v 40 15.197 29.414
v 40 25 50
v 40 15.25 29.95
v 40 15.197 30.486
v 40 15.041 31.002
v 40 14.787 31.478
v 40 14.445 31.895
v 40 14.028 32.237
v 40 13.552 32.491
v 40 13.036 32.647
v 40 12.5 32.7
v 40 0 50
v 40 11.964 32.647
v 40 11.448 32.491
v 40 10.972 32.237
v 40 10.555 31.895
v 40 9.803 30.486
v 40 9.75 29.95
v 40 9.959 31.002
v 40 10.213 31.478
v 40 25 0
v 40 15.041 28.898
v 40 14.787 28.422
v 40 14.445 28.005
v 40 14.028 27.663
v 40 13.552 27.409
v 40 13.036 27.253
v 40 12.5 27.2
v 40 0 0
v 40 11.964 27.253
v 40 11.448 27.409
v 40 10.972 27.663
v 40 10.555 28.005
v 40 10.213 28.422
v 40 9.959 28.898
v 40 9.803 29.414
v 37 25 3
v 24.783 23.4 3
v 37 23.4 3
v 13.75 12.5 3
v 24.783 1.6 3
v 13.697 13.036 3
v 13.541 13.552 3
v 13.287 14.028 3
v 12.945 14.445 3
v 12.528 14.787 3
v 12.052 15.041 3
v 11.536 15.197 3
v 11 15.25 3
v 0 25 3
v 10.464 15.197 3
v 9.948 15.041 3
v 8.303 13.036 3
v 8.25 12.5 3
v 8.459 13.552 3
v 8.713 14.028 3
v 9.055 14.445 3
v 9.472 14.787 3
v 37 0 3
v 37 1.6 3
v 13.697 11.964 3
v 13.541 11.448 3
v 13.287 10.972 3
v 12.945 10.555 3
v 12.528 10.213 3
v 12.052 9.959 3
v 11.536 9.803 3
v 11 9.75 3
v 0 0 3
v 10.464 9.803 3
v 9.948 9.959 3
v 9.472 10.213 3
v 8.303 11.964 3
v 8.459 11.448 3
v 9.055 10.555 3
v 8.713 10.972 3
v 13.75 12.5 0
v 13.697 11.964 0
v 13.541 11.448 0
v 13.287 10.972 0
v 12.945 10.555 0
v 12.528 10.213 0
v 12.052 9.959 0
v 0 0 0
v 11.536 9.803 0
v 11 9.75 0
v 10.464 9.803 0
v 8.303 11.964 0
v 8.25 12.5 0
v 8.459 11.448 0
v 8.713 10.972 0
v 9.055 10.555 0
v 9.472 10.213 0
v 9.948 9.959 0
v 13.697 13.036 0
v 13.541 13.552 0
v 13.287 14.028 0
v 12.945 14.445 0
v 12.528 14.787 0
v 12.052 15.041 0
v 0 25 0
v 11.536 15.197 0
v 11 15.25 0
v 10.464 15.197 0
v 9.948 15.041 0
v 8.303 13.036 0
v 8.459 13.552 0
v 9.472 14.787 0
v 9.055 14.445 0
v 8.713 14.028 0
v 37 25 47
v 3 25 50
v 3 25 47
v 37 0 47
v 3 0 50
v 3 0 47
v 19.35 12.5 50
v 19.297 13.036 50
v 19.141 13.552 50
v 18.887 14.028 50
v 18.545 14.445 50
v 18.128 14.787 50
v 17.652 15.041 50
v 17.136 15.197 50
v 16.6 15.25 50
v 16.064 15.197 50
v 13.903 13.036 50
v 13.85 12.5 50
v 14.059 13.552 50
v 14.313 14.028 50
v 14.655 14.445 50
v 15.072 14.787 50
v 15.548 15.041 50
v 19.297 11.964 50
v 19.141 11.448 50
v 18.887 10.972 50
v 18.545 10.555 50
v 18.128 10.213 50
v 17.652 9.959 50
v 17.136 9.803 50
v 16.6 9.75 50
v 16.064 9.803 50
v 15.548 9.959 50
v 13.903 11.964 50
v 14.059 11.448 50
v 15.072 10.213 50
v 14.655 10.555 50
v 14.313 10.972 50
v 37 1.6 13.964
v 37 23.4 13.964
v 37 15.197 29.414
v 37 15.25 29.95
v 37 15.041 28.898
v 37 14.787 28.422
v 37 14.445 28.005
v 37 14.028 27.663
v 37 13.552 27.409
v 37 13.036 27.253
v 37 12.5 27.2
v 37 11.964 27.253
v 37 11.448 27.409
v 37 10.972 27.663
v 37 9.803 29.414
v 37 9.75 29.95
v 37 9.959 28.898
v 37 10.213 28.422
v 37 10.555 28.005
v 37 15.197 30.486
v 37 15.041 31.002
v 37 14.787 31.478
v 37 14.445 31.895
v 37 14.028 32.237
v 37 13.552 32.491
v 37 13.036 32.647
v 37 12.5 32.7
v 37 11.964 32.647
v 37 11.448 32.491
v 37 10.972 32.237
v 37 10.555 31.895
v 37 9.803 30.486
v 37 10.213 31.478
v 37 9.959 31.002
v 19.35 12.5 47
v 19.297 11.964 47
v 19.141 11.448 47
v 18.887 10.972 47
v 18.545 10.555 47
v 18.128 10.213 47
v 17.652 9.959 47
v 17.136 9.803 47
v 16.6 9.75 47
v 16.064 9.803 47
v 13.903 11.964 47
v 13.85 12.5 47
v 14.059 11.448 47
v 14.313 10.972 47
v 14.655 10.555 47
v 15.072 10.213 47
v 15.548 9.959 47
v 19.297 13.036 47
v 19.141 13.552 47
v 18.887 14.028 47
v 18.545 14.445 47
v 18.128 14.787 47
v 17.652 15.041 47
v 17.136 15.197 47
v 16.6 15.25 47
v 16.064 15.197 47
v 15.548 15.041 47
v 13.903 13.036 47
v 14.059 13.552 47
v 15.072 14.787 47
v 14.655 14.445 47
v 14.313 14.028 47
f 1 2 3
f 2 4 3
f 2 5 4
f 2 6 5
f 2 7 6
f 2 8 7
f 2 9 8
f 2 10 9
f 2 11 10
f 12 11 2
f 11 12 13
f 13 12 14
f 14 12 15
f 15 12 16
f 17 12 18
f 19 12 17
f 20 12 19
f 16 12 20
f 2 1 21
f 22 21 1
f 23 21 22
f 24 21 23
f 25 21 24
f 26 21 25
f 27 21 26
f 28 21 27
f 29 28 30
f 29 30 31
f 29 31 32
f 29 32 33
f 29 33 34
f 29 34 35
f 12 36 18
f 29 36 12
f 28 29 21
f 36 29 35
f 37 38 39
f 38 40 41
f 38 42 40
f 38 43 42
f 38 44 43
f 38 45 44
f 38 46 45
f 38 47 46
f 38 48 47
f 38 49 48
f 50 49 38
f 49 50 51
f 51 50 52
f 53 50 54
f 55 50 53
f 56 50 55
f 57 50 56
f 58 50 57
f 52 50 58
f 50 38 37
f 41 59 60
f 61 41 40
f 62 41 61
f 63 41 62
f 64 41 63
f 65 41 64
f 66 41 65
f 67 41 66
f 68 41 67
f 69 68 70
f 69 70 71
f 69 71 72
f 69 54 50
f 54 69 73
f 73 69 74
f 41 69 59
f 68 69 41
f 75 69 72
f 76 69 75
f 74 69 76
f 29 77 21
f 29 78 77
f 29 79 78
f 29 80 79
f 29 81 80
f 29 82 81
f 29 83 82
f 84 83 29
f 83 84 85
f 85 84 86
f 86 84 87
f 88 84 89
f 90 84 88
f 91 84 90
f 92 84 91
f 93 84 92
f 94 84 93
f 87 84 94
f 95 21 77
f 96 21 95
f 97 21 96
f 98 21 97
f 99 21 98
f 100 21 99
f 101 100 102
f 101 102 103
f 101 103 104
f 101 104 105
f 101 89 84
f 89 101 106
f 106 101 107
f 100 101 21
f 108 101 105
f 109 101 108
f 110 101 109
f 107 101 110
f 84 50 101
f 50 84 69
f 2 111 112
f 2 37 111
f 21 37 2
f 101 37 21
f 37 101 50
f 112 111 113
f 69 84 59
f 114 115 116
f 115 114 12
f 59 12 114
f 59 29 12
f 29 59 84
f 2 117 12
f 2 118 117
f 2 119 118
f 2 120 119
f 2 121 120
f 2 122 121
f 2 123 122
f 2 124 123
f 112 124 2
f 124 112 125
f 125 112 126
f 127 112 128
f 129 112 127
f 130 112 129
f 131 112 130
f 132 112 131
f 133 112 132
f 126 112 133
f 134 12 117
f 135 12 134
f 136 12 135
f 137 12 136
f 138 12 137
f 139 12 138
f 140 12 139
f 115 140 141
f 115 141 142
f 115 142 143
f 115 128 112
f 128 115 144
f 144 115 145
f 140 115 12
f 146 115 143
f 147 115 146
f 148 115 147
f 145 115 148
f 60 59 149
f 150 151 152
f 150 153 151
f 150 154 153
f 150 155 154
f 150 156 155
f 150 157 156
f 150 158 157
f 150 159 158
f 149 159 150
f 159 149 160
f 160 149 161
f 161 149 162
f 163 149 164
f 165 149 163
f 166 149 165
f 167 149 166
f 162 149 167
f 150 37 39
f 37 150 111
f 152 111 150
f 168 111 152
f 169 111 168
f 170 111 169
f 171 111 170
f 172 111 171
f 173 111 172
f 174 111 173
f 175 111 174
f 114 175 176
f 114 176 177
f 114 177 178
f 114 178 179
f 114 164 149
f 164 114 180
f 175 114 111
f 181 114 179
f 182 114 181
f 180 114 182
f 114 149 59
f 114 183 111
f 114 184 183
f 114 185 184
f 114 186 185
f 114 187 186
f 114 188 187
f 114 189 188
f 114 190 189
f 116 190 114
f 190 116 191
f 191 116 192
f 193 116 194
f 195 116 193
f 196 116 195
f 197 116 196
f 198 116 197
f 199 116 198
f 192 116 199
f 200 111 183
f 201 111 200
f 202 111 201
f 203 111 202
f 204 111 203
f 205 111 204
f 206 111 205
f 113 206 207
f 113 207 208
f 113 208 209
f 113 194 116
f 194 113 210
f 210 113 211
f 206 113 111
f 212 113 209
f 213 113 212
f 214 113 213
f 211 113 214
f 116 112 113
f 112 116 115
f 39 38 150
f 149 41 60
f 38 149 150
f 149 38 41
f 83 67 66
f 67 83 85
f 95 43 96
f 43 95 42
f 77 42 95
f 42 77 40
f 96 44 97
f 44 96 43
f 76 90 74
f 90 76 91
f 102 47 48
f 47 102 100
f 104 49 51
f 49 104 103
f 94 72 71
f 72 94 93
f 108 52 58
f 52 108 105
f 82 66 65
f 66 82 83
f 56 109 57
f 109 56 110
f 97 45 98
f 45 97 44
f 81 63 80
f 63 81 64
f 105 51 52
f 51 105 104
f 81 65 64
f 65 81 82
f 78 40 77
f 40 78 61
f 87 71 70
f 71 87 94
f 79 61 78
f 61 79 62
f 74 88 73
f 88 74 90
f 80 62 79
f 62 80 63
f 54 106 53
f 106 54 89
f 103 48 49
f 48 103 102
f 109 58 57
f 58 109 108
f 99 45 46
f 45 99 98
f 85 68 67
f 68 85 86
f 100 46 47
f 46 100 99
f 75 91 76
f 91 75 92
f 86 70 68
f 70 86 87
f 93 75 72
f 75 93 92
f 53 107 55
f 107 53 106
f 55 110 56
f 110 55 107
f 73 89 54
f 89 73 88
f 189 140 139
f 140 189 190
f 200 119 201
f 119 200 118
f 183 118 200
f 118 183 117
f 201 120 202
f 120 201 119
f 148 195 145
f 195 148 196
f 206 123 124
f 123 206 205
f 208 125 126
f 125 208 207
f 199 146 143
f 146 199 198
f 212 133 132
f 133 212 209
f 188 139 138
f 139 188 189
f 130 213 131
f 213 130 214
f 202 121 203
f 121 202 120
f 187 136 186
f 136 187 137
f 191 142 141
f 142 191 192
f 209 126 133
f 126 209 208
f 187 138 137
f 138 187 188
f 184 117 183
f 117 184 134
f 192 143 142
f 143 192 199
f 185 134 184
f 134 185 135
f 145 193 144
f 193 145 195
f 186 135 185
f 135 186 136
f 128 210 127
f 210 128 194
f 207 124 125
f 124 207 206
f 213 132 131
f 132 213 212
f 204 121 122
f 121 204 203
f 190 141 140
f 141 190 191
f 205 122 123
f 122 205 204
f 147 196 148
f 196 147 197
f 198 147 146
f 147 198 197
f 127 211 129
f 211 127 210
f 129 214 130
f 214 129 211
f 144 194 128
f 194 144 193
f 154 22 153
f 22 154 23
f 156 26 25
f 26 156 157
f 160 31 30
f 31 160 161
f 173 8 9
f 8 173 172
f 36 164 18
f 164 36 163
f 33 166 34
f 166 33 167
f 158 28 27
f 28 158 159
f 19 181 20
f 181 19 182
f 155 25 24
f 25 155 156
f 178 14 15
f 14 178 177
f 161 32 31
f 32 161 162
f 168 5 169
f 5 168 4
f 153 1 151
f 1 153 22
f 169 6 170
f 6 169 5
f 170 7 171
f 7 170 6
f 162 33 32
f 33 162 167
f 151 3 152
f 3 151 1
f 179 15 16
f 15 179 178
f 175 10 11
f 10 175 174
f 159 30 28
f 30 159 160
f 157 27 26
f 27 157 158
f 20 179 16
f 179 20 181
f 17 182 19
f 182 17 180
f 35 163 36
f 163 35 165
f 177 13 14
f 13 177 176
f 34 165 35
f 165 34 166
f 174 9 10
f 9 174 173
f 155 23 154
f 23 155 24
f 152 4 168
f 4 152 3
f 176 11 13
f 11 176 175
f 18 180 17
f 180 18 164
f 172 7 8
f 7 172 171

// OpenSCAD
$fn = 32;

// ----------------------------------------------------------------------
// Z-bracket: 40 x 25 x 50 mm
// ----------------------------------------------------------------------

// --- parameters (mm) ---
bottom_run = 40;          // lower foot length, X
top_run = 34;             // upper foot length, X
profile_w = 25;           // bracket width, Y
height = 50;              // overall rise, Z
mat_t = 3;                // plate thickness
hole_d = 5.5;             // clearance for M5
rib_len = 14;             // gusset leg
rib_sink = 1.6;           // gusset overlap into the plates

module hole_z(px, py, z0) {
  translate([px, py, z0 - 2.5]) cylinder(h = mat_t + 5, d = hole_d);
}
module hole_x(py, pz) {
  translate([-2.5, py, pz]) rotate([0, 90, 0]) cylinder(h = mat_t + 5, d = hole_d);
}
module gusset(x0) {
  translate([x0, profile_w - rib_sink, 0])
    rotate([90, 0, 0])
      linear_extrude(height = profile_w - 2 * rib_sink)
        polygon(points = [[rib_sink, mat_t - rib_sink],
                          [rib_sink, mat_t - rib_sink + rib_len],
                          [-rib_len, mat_t - rib_sink]]);
}

difference() {
  union() {
    cube([bottom_run, profile_w, mat_t]);
    /* web, overlapping the lower foot */
    translate([bottom_run - mat_t, 0, 0]) cube([mat_t, profile_w, height]);
    /* upper foot, sunk into the web */
    translate([bottom_run - mat_t - top_run, 0, height - mat_t]) cube([top_run + mat_t, profile_w, mat_t]);
    gusset(bottom_run - mat_t);
  }
  hole_z(11, 12.5, 0);
  translate([bottom_run - mat_t - 20.4, 0, 0]) hole_z(0, 12.5, height - mat_t);
  translate([bottom_run - mat_t, 0, 0]) hole_x(12.5, 29.95);
}
